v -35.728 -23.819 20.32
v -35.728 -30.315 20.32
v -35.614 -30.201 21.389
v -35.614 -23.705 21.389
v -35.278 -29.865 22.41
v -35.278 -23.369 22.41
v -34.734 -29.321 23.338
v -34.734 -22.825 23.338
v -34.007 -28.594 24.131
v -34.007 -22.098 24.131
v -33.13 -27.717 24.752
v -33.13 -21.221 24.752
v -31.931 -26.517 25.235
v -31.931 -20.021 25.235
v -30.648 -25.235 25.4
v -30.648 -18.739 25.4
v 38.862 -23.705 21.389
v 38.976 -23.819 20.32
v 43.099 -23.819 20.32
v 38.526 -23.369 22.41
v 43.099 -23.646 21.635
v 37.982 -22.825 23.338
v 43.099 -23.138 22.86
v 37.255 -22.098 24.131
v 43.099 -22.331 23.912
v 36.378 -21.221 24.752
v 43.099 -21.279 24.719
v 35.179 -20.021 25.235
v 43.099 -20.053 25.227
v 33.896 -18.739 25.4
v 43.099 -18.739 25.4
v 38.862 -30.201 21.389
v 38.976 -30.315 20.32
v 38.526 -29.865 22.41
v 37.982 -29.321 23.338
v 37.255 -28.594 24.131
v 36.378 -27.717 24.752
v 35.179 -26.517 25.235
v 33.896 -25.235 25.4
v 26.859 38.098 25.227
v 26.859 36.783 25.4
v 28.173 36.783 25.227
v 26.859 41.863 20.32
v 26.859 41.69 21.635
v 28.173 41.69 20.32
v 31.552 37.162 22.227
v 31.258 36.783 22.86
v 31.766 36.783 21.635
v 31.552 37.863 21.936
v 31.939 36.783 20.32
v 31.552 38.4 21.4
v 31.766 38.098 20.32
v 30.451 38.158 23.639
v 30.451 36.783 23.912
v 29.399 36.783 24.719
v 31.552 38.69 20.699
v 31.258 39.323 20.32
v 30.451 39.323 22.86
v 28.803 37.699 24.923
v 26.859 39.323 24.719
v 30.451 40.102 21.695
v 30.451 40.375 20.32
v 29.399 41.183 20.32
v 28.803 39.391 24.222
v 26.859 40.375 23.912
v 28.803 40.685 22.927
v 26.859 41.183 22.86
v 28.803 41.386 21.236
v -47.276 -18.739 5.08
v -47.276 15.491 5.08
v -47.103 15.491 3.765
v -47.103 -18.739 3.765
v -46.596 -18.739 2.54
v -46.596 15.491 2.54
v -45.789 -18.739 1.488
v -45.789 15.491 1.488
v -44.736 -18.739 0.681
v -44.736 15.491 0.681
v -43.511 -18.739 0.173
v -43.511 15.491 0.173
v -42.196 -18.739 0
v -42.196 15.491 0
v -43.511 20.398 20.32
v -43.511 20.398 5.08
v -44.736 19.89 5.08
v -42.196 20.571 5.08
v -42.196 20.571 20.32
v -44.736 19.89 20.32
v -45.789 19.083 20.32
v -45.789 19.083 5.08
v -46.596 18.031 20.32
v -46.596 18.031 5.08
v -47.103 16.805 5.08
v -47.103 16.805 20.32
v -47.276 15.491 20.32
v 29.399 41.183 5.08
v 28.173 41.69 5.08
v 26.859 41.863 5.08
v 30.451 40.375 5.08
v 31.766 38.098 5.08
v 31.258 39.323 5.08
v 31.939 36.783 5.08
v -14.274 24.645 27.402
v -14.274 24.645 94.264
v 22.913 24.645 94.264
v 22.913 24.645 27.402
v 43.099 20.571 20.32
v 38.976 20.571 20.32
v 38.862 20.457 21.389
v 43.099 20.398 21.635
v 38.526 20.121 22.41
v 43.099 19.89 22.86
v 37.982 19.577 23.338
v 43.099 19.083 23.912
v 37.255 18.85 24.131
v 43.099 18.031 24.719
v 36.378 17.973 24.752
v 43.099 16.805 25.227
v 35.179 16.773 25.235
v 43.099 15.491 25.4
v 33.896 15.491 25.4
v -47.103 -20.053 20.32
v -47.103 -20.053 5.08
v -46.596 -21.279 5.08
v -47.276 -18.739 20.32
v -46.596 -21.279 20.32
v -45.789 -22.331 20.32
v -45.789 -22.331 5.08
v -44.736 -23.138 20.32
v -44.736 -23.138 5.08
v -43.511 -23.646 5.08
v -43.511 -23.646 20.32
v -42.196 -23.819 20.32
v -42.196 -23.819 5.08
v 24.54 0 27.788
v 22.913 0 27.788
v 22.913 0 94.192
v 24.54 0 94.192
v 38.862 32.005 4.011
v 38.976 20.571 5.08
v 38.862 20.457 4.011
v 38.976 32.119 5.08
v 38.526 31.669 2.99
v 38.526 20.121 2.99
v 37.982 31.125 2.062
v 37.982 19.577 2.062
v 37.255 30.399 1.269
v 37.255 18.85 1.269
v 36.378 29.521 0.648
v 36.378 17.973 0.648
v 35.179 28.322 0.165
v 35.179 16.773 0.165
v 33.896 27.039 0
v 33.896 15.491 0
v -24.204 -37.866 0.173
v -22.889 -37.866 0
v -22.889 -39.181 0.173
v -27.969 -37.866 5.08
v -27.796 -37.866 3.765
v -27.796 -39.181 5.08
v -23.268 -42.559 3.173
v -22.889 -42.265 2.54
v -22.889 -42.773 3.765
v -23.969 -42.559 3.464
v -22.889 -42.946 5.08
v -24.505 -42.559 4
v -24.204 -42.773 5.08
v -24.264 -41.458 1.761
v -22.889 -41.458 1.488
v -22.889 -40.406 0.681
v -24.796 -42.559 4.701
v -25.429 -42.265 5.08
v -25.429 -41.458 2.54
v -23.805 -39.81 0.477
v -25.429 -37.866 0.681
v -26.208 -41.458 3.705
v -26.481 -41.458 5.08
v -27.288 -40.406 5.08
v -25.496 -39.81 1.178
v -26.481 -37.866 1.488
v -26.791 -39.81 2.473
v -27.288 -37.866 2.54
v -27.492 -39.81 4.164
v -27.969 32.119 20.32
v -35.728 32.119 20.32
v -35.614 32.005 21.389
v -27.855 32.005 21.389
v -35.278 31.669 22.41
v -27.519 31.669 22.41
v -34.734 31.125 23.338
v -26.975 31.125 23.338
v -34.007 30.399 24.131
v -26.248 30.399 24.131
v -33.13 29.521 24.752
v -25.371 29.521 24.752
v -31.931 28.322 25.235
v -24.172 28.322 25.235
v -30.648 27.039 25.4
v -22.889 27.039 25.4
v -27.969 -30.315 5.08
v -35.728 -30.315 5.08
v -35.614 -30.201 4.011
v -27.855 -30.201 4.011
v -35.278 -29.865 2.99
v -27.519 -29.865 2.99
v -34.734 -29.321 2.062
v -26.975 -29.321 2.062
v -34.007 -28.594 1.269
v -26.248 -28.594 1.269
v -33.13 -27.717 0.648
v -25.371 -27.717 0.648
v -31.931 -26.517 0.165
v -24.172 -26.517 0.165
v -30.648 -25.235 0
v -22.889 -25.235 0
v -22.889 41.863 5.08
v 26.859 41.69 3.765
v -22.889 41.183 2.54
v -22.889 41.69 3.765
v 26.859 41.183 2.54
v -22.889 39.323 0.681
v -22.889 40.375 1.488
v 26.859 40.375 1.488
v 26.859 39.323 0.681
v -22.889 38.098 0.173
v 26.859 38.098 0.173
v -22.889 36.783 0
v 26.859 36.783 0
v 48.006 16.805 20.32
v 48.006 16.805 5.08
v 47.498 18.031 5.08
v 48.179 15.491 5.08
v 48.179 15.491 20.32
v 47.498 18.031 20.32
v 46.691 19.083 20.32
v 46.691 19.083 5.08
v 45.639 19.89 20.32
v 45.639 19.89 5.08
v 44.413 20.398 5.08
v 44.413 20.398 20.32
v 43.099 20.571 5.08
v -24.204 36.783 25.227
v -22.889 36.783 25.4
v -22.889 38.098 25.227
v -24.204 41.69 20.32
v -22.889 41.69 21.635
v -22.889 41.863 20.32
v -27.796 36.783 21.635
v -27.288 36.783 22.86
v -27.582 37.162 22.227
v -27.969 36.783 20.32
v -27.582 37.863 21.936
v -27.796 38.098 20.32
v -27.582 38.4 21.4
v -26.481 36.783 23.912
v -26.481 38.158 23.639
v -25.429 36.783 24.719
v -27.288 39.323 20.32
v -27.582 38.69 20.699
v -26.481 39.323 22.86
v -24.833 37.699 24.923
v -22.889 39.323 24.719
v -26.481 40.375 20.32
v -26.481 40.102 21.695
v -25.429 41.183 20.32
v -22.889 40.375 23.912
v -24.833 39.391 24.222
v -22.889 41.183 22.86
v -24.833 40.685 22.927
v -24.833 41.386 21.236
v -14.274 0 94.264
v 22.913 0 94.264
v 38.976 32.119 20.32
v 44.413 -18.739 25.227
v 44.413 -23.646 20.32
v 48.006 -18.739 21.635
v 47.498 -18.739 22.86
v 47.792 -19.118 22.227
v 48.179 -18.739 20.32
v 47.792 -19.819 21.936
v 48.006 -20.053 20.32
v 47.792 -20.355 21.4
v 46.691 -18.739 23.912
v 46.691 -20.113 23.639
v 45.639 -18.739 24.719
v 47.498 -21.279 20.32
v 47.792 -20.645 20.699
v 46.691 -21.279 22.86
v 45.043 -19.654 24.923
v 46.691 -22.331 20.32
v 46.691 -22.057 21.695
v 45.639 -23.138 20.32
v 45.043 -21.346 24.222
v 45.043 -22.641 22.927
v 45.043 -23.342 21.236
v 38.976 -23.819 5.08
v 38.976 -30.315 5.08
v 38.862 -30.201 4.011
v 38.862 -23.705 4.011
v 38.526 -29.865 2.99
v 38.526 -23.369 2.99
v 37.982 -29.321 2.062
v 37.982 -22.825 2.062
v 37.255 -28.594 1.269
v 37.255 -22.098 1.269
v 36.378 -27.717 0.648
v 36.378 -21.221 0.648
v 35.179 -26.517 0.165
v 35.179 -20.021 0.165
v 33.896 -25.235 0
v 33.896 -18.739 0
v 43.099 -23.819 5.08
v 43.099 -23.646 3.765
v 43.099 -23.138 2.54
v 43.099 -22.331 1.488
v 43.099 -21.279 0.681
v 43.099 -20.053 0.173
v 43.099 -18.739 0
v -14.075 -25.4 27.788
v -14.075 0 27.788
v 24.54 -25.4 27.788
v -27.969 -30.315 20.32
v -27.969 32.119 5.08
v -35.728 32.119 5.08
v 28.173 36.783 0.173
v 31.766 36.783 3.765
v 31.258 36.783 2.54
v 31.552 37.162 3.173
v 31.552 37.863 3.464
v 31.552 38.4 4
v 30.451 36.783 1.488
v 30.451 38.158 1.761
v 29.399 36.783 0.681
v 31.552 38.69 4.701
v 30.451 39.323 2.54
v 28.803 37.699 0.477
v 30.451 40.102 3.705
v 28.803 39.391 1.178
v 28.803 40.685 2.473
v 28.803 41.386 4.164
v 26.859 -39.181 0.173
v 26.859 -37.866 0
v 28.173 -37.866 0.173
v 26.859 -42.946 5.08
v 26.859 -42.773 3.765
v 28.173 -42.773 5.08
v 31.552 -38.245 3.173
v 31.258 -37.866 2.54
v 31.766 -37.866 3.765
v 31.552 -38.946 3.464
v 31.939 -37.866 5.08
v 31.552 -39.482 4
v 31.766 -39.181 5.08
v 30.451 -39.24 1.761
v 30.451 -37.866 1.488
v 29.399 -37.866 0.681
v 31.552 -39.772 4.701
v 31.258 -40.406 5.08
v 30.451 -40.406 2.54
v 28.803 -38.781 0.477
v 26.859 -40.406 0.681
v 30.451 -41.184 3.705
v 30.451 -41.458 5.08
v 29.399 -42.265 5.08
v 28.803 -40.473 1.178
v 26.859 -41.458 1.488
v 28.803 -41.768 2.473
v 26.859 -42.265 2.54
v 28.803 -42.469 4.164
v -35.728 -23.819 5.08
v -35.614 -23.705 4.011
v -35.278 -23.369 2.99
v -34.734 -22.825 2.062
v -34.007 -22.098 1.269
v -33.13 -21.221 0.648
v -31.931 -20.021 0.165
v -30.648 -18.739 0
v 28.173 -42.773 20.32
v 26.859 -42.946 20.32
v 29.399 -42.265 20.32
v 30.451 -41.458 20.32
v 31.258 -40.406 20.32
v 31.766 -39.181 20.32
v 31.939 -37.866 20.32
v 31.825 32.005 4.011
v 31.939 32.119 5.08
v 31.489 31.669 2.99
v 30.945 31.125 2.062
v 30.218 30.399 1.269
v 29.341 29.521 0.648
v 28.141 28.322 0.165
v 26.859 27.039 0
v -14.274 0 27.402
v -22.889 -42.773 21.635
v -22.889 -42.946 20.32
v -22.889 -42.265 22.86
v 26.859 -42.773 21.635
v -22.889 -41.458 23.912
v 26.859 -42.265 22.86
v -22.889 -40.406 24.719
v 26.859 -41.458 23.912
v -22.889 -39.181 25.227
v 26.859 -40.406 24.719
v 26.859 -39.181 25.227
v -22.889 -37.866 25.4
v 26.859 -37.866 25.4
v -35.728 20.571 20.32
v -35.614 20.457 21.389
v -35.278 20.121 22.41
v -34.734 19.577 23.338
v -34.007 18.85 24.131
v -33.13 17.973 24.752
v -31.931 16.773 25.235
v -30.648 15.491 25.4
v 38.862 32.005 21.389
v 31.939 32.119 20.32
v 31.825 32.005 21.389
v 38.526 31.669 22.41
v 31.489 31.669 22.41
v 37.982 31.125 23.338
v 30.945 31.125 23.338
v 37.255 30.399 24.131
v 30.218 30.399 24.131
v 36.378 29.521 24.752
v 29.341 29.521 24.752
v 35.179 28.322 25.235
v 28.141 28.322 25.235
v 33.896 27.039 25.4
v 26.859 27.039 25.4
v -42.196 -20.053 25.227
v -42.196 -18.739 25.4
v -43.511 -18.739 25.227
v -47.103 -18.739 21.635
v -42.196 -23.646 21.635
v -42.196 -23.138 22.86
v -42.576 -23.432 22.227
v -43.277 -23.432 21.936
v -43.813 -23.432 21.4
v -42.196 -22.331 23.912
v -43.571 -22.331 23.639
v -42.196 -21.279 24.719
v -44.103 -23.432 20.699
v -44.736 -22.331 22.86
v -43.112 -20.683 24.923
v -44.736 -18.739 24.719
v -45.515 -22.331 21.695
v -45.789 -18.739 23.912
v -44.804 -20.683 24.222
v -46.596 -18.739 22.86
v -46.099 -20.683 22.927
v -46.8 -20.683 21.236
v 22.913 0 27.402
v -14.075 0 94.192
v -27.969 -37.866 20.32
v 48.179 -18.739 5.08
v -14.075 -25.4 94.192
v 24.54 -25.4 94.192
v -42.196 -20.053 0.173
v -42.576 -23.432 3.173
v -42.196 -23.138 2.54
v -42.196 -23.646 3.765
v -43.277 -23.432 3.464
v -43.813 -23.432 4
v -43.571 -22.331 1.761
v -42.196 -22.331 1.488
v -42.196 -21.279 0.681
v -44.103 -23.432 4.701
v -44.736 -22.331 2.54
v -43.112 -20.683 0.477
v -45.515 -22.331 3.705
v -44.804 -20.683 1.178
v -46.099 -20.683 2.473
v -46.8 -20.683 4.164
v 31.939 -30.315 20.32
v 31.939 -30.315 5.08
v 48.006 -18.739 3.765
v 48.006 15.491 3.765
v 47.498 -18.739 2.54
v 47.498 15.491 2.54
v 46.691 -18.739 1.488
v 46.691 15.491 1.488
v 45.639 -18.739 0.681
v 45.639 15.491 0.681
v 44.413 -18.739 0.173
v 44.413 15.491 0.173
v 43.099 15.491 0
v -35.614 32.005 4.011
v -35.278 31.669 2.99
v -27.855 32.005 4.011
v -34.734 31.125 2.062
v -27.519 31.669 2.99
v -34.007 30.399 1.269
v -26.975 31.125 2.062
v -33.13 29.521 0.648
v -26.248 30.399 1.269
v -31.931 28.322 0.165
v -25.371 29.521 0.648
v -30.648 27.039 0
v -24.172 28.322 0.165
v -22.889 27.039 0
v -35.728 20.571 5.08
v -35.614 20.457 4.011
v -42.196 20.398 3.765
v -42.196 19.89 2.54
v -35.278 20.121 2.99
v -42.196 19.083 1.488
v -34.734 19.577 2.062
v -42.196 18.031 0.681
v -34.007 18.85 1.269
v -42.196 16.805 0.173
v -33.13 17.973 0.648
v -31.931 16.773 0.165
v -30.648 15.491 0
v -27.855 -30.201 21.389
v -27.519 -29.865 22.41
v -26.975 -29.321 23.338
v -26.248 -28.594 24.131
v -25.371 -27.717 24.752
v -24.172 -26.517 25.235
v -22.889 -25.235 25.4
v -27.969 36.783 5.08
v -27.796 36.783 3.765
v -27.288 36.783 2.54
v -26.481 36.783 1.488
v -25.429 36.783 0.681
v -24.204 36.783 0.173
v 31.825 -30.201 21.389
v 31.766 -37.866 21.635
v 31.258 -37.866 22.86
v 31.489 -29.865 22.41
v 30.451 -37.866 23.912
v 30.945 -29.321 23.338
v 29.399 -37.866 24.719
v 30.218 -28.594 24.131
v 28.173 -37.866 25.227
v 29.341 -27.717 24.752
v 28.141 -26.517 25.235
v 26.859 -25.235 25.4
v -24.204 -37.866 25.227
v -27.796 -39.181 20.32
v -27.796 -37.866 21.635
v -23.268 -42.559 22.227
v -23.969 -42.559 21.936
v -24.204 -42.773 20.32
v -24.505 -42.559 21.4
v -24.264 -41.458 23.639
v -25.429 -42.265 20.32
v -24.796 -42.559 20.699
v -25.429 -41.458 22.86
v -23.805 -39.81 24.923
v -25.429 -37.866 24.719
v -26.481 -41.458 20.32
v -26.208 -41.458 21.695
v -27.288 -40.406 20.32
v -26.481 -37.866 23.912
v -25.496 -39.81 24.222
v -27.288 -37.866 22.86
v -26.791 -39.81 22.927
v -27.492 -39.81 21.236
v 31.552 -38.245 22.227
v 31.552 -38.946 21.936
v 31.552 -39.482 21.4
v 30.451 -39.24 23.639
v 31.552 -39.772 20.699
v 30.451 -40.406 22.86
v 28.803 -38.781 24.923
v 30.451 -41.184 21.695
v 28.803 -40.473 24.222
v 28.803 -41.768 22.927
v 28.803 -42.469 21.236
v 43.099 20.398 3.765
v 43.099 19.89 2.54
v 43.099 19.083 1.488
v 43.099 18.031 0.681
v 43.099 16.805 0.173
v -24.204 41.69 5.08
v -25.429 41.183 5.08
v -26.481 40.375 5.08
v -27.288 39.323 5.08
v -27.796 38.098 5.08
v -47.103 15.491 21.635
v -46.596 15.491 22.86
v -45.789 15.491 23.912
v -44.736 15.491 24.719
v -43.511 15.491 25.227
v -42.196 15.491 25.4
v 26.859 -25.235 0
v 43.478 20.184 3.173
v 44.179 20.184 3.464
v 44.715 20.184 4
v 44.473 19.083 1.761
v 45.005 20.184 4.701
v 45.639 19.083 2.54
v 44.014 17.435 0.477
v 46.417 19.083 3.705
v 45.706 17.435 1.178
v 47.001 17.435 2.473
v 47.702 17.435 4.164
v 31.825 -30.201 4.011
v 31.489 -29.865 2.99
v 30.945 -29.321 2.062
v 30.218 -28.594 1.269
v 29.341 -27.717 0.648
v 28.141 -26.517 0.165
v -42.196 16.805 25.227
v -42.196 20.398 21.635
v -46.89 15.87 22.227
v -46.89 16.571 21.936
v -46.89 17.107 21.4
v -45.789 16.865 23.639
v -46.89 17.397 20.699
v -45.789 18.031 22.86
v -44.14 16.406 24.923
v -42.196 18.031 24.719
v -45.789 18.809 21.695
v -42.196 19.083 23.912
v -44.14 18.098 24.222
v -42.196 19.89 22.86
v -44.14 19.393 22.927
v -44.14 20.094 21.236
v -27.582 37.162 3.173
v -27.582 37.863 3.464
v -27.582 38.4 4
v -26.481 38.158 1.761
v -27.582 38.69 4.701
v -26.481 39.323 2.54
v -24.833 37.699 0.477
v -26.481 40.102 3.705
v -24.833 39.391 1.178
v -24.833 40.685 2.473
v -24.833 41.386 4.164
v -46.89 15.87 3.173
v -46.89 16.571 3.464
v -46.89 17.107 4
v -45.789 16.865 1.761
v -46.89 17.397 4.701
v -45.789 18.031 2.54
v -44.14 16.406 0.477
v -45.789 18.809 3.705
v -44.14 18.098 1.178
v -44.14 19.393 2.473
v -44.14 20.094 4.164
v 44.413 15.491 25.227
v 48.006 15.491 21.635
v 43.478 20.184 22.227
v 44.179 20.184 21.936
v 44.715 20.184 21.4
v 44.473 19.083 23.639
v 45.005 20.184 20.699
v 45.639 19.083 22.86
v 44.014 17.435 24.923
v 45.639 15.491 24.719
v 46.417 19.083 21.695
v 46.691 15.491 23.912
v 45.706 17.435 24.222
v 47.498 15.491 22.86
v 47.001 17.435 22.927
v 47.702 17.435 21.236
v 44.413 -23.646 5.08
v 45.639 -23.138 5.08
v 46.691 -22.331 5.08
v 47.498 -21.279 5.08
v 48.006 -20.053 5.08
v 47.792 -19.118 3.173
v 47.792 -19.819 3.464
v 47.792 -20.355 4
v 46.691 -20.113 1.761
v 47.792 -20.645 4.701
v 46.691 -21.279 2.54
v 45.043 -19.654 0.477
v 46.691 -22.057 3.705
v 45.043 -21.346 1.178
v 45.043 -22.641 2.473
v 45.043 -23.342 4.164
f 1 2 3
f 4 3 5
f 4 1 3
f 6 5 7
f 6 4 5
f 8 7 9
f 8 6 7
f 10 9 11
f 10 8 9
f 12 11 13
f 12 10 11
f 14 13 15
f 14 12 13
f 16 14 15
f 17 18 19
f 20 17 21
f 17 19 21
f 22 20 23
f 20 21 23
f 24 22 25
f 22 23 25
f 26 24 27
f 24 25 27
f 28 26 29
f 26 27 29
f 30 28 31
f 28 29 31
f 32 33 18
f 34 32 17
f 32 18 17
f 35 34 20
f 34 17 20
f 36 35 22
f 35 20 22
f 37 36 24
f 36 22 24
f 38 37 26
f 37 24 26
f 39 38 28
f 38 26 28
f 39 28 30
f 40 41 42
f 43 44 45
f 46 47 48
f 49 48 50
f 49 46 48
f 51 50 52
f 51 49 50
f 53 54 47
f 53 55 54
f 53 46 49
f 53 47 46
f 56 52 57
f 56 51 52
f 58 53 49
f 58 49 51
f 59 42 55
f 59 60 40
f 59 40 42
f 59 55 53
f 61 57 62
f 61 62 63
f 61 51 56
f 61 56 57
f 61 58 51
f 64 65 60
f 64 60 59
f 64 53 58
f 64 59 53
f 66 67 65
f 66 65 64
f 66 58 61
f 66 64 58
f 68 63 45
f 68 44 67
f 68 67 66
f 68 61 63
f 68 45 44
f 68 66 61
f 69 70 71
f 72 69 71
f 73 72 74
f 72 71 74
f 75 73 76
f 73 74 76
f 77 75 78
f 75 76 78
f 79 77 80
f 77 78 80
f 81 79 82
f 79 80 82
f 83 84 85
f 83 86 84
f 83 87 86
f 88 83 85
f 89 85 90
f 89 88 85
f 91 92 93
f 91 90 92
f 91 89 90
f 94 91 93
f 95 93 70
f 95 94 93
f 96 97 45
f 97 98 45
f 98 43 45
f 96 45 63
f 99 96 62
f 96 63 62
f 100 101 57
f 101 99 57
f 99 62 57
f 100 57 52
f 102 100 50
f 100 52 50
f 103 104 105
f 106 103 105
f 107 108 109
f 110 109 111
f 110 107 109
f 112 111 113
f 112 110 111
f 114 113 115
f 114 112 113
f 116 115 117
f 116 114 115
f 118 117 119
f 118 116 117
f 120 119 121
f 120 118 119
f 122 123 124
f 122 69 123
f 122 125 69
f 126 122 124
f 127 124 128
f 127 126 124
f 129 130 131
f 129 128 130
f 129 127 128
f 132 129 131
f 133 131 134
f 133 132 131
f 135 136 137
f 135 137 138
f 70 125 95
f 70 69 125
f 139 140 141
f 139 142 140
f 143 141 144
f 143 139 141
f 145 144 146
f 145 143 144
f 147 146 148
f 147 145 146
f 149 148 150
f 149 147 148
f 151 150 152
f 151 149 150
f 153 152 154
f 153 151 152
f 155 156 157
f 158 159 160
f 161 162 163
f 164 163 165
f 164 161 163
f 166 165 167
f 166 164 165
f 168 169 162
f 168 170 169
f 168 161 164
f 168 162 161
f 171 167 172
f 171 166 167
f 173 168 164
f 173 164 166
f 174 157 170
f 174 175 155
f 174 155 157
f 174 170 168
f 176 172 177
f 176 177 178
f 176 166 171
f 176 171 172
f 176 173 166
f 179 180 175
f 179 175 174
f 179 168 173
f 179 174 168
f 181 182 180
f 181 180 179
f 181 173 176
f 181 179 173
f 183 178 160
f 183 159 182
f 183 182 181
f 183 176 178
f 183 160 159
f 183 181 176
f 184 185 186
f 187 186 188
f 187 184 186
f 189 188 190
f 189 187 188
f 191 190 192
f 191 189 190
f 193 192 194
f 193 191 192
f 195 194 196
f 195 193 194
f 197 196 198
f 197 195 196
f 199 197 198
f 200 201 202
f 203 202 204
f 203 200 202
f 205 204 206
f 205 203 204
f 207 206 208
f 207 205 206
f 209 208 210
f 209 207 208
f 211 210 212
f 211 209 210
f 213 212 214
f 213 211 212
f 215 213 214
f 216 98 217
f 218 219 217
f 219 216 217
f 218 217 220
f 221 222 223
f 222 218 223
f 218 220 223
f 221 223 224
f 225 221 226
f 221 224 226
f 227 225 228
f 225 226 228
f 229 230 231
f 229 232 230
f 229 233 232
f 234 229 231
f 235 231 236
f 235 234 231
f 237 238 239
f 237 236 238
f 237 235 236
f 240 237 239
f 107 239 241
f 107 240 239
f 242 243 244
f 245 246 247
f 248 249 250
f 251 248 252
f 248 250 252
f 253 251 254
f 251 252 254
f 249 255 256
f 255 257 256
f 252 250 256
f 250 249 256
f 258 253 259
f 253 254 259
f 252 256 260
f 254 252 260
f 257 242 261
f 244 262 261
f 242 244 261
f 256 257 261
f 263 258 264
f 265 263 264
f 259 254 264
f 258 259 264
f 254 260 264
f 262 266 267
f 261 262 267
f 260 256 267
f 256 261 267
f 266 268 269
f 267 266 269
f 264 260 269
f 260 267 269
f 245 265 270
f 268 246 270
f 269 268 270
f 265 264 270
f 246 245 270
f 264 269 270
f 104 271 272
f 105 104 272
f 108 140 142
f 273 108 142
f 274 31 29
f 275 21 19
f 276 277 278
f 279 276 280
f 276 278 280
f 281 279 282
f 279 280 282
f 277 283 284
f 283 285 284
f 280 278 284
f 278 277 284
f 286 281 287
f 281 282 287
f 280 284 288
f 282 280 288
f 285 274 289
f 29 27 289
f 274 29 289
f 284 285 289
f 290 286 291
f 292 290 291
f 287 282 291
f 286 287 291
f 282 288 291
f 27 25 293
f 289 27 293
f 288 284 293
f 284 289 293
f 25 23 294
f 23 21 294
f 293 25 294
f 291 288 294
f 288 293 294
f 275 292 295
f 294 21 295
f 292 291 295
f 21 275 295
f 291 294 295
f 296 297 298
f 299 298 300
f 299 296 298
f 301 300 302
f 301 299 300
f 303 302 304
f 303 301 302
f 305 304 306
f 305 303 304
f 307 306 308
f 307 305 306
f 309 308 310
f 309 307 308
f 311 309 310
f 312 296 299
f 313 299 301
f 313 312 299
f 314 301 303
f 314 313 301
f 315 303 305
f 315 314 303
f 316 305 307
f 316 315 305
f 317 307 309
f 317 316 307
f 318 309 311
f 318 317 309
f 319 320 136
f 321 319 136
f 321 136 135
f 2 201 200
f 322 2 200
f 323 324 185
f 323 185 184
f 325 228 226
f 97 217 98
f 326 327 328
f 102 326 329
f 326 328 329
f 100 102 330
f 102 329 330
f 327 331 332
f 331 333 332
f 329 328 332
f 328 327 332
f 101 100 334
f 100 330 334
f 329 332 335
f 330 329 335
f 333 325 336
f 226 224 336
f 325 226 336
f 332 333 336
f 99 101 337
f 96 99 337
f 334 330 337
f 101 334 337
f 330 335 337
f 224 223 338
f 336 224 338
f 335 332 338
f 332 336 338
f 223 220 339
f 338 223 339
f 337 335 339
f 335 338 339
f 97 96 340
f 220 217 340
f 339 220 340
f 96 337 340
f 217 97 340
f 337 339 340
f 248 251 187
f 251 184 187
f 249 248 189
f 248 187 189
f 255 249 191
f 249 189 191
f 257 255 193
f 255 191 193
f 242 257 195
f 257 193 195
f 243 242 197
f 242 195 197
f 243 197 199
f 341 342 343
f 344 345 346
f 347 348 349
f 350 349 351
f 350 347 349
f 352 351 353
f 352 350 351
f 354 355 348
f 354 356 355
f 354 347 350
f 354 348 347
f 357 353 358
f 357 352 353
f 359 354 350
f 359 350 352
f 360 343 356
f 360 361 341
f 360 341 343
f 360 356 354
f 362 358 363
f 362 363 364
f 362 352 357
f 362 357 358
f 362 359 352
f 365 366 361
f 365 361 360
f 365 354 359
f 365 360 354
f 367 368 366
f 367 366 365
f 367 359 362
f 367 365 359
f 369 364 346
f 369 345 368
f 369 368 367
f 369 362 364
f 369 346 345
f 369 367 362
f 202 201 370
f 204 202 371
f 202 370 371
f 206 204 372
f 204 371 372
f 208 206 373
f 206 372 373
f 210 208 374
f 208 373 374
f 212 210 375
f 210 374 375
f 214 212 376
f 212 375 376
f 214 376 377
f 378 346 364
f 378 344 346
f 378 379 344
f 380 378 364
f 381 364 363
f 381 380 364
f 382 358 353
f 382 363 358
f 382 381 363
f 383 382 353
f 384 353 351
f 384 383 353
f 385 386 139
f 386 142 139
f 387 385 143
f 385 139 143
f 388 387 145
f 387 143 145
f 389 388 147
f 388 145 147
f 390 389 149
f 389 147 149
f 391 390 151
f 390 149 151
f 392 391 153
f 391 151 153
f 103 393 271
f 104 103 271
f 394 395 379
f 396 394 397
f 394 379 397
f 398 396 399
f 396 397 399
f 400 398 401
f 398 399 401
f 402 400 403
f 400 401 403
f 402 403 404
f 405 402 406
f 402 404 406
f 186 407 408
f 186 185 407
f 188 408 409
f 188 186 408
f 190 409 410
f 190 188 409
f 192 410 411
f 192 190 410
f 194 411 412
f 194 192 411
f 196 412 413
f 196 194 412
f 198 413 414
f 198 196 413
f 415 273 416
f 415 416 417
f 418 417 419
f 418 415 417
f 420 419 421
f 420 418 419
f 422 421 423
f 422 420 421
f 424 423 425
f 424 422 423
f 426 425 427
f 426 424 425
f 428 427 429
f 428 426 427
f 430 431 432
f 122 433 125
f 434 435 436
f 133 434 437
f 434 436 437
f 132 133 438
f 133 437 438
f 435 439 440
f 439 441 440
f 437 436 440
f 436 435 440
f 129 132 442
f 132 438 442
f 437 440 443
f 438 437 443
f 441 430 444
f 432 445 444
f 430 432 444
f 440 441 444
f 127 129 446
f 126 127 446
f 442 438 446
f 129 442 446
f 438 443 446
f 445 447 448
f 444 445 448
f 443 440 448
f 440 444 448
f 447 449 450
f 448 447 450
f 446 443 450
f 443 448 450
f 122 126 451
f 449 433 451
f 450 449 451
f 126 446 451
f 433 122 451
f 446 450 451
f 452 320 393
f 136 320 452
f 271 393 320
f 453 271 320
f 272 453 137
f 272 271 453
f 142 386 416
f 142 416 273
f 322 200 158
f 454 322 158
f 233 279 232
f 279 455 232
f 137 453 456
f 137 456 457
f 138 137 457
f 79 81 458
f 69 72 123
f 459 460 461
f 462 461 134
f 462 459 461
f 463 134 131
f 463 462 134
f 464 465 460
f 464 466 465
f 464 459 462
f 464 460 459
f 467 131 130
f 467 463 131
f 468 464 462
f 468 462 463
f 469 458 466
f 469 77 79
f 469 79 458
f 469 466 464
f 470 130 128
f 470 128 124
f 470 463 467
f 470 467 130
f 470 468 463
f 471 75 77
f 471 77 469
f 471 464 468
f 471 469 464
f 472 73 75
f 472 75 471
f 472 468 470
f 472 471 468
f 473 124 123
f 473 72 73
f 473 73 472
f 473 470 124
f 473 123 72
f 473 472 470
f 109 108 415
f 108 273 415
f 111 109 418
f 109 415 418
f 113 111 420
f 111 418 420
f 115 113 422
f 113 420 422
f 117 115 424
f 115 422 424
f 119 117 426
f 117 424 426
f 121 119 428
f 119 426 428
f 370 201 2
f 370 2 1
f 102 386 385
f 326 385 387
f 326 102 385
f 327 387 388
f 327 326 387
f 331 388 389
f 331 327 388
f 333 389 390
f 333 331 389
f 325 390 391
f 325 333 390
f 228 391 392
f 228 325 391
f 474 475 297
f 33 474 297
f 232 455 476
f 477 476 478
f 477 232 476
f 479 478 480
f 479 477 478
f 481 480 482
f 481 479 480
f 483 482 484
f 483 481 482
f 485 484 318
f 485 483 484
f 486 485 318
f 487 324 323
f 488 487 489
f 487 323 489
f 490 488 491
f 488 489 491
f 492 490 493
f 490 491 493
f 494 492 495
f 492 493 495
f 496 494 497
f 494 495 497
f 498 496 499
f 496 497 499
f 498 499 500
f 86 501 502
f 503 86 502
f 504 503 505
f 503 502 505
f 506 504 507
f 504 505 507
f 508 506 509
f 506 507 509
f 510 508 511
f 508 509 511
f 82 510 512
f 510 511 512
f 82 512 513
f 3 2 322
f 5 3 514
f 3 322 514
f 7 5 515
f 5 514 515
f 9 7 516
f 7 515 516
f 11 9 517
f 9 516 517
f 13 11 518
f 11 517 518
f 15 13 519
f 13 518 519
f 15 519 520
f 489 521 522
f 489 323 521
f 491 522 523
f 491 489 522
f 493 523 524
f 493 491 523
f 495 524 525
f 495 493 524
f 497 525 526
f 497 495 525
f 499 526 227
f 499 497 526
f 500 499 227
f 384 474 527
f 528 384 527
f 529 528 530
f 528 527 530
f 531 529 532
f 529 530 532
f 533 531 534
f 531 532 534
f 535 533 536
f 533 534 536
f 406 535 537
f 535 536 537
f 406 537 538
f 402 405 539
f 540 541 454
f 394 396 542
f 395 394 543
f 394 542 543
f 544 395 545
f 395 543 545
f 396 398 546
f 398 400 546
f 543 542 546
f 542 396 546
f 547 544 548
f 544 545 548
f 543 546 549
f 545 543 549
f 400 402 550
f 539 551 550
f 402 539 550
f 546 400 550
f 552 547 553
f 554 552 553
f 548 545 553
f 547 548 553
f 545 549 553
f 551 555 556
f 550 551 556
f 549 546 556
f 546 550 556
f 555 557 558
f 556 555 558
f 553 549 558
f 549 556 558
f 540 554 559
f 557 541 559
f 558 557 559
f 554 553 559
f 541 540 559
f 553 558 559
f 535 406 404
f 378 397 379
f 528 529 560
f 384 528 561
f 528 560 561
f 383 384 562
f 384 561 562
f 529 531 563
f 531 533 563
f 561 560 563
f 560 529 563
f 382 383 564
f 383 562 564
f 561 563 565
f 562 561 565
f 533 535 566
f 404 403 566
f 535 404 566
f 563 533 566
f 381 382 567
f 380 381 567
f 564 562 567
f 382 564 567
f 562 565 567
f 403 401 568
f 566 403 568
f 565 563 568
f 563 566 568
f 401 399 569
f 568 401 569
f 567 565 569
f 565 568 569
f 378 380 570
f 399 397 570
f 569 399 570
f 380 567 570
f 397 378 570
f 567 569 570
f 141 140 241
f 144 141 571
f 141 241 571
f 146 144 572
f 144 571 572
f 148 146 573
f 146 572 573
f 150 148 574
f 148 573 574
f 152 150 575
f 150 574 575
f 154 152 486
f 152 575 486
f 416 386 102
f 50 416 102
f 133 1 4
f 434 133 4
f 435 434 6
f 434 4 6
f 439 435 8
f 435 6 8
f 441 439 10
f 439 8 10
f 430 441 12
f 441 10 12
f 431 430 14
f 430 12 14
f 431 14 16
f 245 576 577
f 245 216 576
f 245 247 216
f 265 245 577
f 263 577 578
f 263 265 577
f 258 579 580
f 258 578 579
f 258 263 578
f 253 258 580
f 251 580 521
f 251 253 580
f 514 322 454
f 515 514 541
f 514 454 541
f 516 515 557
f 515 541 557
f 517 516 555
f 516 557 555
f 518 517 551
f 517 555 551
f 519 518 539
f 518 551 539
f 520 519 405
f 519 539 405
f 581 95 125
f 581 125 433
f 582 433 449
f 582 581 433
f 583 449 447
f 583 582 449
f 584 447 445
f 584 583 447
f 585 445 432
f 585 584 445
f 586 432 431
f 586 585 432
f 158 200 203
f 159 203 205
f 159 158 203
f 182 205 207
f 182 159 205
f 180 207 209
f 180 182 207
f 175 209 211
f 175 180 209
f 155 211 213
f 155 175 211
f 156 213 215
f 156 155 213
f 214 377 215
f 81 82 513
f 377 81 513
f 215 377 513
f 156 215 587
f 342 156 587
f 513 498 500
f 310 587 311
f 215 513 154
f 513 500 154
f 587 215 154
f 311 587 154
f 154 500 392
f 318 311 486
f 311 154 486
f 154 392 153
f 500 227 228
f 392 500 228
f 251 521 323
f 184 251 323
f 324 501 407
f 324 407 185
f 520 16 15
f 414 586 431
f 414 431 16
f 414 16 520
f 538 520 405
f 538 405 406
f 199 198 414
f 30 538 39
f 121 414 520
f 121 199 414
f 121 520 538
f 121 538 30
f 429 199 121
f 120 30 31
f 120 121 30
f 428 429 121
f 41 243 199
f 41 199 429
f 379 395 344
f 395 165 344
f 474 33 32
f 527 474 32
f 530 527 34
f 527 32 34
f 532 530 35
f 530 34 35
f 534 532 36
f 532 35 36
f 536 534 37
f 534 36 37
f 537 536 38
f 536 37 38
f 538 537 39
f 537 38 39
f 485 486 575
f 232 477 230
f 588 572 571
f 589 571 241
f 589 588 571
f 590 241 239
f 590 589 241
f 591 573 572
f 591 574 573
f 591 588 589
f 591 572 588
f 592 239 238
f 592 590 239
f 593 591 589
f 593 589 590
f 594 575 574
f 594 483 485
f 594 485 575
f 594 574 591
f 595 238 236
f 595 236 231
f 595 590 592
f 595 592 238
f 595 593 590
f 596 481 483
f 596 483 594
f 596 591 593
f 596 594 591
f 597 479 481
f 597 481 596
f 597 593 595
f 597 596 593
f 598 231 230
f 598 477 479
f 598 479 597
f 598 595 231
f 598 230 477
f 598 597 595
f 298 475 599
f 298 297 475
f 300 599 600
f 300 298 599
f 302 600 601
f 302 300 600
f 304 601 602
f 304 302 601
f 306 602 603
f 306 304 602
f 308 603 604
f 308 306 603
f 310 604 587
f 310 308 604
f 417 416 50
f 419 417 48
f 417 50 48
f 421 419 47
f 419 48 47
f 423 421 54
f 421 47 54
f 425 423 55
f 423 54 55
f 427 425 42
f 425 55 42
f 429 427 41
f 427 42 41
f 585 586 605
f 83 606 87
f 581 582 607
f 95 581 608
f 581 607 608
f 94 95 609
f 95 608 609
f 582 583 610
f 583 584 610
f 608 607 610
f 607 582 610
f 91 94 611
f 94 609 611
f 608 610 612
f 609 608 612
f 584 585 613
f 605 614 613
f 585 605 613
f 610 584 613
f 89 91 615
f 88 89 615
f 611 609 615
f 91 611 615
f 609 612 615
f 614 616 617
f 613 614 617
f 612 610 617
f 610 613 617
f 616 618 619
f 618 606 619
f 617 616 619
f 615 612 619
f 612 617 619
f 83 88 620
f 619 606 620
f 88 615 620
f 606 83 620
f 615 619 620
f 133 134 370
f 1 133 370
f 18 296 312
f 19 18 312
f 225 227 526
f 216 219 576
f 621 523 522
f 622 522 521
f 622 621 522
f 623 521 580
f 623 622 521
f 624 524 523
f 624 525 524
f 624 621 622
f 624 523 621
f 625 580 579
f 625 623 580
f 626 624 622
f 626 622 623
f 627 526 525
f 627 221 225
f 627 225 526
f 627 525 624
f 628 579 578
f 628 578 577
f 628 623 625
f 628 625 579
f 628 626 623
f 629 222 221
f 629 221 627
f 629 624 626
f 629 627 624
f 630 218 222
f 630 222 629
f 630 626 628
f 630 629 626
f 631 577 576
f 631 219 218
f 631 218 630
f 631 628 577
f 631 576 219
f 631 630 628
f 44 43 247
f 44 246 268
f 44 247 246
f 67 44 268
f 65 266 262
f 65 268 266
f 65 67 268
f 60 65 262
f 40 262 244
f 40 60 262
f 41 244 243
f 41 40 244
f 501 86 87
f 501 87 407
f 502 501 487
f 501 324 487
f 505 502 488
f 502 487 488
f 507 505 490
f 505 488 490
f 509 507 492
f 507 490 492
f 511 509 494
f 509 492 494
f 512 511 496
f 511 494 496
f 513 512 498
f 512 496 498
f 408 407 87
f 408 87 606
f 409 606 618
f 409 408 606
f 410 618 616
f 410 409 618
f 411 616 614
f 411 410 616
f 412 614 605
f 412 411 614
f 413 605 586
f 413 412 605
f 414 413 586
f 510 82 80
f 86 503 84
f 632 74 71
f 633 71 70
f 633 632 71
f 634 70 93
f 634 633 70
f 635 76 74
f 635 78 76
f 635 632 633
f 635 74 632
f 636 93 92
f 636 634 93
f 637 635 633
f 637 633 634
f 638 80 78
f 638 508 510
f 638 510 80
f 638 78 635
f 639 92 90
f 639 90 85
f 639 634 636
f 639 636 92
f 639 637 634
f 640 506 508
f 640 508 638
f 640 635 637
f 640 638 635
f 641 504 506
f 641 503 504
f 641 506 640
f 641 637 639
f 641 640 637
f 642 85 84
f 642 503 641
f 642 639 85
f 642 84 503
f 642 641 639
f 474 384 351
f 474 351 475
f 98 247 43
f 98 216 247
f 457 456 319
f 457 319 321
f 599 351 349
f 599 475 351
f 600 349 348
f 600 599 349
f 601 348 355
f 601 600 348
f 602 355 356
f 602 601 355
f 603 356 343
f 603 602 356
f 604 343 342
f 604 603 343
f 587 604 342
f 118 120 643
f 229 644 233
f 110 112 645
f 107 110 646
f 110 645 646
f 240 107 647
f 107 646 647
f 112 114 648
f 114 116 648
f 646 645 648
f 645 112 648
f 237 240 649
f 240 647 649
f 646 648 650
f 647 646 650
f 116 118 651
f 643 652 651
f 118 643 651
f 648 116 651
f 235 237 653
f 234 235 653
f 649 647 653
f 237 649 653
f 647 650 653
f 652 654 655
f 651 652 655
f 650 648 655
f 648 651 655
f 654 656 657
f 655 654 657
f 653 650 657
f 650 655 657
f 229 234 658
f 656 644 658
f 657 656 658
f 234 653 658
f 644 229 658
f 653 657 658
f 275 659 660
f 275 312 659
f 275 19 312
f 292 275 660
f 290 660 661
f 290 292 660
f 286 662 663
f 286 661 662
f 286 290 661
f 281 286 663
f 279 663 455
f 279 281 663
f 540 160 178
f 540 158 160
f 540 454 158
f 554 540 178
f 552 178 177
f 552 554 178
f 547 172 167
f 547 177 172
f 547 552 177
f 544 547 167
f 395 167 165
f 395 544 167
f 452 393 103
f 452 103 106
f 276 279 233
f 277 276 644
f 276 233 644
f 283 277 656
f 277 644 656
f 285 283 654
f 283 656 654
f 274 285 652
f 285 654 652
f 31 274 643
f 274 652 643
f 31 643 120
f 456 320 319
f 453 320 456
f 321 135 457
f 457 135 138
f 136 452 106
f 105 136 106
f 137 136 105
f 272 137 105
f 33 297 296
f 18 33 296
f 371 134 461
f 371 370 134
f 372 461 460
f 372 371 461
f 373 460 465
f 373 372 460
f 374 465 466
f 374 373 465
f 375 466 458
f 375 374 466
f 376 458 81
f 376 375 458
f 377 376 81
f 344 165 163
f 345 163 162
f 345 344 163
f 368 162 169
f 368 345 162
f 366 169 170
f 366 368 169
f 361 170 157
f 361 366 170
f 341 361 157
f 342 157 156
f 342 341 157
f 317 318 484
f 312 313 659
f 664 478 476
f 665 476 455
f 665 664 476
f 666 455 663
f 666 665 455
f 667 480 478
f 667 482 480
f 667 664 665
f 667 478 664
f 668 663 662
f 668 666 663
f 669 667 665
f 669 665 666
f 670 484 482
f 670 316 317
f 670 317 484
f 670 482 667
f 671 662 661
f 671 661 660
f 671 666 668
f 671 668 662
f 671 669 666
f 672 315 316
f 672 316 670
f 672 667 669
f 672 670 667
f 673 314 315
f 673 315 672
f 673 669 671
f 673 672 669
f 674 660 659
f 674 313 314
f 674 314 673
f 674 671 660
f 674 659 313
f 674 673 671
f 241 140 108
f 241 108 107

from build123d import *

# Parameters (mm, degrees)
F0_W     = 59.9075704813
F0_H     = 44.3893522024
F0_H_2   = 11.5484446287
F0_H_3   = 9.7440034151
F0_W_2   = 11.5484446287
F0_W_3   = 7.75911659
F0_H_4   = 6.4959973097
F0_H_5   = 12.6311182976
F0_W_4   = 9.2026740313
F0_W_5   = 7.0373415947
F1_DEPTH = 25.4
F2_R     = 5.08
F3_W     = 38.6151224375
F3_H     = 66.4035752416
F4_DEPTH = 25.4
F5_W     = 37.1871963143
F5_H     = 66.8618455529
F6_DEPTH = 24.6451962739


with BuildPart() as f1:
    # F0 (on Top) → F1 (new body)
    with BuildSketch(Plane.XY):
        with Locations((1.9848868251, -1.6240105033)):
            Rectangle(F0_W, F0_H)
        with Locations((1.9848868251, 26.3448879123)):
            Rectangle(F0_W, F0_H_2)
        with Locations((1.9848868251, 36.9911119342)):
            Rectangle(F0_W, F0_H_3)
        with Locations((-41.5022373199, -1.6240105033)):
            Rectangle(F0_W_2, F0_H)
        with Locations((-31.8484567106, 26.3448879123)):
            Rectangle(F0_W_3, F0_H_2)
        with Locations((-31.8484567106, -1.6240105033)):
            Rectangle(F0_W_3, F0_H)
        with Locations((1.9848868251, -27.0666852593)):
            Rectangle(F0_W, F0_H_4)
        with Locations((1.9848868251, -36.630243063)):
            Rectangle(F0_W, F0_H_5)
        with Locations((-31.8484567106, -27.0666852593)):
            Rectangle(F0_W_3, F0_H_4)
        with Locations((43.5773506761, -1.6240105033)):
            Rectangle(F0_W_4, F0_H)
        with Locations((35.4573428631, 26.3448879123)):
            Rectangle(F0_W_5, F0_H_2)
        with Locations((35.4573428631, -27.0666852593)):
            Rectangle(F0_W_5, F0_H_4)
        with Locations((35.4573428631, -1.6240105033)):
            Rectangle(F0_W_5, F0_H)
    extrude(amount=F1_DEPTH)

    # F2
    f2_edges = [f1.edges().sort_by_distance(p)[0] for p in [
        (1.984887, 41.863114, 25.4),
        (-27.968898, 36.991112, 25.4),
        (-31.848457, 32.11911, 25.4),
        (-35.728015, 26.344888, 25.4),
        (-41.502237, 20.570666, 25.4),
        (-47.27646, -1.624011, 25.4),
        (-41.502237, -23.818687, 25.4),
        (-35.728015, -27.066685, 25.4),
        (-31.848457, -30.314684, 25.4),
        (-27.968898, -36.630243, 25.4),
        (1.984887, -42.945802, 25.4),
        (31.938672, -36.630243, 25.4),
        (35.457343, -30.314684, 25.4),
        (38.976014, -27.066685, 25.4),
        (43.577351, -23.818687, 25.4),
        (48.178688, -1.624011, 25.4),
        (43.577351, 20.570666, 25.4),
        (38.976014, 26.344888, 25.4),
        (35.457343, 32.11911, 25.4),
        (31.938672, 36.991112, 25.4),
        (1.984887, 41.863114, 0),
        (-27.968898, 36.991112, 0),
        (-31.848457, 32.11911, 0),
        (-35.728015, 26.344888, 0),
        (-41.502237, 20.570666, 0),
        (-47.27646, -1.624011, 0),
        (-41.502237, -23.818687, 0),
        (-35.728015, -27.066685, 0),
        (-31.848457, -30.314684, 0),
        (-27.968898, -36.630243, 0),
        (1.984887, -42.945802, 0),
        (31.938672, -36.630243, 0),
        (35.457343, -30.314684, 0),
        (38.976014, -27.066685, 0),
        (43.577351, -23.818687, 0),
        (48.178688, -1.624011, 0),
        (43.577351, 20.570666, 0),
        (38.976014, 26.344888, 0),
        (35.457343, 32.11911, 0),
        (31.938672, 36.991112, 0),
        (-27.968898, -42.945802, 12.7),
        (31.938672, -42.945802, 12.7),
        (-47.27646, 20.570666, 12.7),
        (-47.27646, -23.818687, 12.7),
        (31.938672, 41.863114, 12.7),
        (-27.968898, 41.863114, 12.7),
        (48.178688, -23.818687, 12.7),
        (48.178688, 20.570666, 12.7),
    ]]
    fillet(f2_edges, radius=F2_R)


with BuildPart() as f4:
    # F3 (on Front) → F4 (new body)
    with BuildSketch(Plane.XZ):
        with Locations((5.2328929305, 60.9902329743)):
            Rectangle(F3_W, F3_H)
    extrude(amount=F4_DEPTH)

    # F5 (on Front) → F6 (join)
    with BuildSketch(Plane.XZ):
        with Locations((4.3197311461, 60.8326978981)):
            Rectangle(F5_W, F5_H)
    extrude(amount=-F6_DEPTH)


solid = Compound([f1.part, f4.part])
